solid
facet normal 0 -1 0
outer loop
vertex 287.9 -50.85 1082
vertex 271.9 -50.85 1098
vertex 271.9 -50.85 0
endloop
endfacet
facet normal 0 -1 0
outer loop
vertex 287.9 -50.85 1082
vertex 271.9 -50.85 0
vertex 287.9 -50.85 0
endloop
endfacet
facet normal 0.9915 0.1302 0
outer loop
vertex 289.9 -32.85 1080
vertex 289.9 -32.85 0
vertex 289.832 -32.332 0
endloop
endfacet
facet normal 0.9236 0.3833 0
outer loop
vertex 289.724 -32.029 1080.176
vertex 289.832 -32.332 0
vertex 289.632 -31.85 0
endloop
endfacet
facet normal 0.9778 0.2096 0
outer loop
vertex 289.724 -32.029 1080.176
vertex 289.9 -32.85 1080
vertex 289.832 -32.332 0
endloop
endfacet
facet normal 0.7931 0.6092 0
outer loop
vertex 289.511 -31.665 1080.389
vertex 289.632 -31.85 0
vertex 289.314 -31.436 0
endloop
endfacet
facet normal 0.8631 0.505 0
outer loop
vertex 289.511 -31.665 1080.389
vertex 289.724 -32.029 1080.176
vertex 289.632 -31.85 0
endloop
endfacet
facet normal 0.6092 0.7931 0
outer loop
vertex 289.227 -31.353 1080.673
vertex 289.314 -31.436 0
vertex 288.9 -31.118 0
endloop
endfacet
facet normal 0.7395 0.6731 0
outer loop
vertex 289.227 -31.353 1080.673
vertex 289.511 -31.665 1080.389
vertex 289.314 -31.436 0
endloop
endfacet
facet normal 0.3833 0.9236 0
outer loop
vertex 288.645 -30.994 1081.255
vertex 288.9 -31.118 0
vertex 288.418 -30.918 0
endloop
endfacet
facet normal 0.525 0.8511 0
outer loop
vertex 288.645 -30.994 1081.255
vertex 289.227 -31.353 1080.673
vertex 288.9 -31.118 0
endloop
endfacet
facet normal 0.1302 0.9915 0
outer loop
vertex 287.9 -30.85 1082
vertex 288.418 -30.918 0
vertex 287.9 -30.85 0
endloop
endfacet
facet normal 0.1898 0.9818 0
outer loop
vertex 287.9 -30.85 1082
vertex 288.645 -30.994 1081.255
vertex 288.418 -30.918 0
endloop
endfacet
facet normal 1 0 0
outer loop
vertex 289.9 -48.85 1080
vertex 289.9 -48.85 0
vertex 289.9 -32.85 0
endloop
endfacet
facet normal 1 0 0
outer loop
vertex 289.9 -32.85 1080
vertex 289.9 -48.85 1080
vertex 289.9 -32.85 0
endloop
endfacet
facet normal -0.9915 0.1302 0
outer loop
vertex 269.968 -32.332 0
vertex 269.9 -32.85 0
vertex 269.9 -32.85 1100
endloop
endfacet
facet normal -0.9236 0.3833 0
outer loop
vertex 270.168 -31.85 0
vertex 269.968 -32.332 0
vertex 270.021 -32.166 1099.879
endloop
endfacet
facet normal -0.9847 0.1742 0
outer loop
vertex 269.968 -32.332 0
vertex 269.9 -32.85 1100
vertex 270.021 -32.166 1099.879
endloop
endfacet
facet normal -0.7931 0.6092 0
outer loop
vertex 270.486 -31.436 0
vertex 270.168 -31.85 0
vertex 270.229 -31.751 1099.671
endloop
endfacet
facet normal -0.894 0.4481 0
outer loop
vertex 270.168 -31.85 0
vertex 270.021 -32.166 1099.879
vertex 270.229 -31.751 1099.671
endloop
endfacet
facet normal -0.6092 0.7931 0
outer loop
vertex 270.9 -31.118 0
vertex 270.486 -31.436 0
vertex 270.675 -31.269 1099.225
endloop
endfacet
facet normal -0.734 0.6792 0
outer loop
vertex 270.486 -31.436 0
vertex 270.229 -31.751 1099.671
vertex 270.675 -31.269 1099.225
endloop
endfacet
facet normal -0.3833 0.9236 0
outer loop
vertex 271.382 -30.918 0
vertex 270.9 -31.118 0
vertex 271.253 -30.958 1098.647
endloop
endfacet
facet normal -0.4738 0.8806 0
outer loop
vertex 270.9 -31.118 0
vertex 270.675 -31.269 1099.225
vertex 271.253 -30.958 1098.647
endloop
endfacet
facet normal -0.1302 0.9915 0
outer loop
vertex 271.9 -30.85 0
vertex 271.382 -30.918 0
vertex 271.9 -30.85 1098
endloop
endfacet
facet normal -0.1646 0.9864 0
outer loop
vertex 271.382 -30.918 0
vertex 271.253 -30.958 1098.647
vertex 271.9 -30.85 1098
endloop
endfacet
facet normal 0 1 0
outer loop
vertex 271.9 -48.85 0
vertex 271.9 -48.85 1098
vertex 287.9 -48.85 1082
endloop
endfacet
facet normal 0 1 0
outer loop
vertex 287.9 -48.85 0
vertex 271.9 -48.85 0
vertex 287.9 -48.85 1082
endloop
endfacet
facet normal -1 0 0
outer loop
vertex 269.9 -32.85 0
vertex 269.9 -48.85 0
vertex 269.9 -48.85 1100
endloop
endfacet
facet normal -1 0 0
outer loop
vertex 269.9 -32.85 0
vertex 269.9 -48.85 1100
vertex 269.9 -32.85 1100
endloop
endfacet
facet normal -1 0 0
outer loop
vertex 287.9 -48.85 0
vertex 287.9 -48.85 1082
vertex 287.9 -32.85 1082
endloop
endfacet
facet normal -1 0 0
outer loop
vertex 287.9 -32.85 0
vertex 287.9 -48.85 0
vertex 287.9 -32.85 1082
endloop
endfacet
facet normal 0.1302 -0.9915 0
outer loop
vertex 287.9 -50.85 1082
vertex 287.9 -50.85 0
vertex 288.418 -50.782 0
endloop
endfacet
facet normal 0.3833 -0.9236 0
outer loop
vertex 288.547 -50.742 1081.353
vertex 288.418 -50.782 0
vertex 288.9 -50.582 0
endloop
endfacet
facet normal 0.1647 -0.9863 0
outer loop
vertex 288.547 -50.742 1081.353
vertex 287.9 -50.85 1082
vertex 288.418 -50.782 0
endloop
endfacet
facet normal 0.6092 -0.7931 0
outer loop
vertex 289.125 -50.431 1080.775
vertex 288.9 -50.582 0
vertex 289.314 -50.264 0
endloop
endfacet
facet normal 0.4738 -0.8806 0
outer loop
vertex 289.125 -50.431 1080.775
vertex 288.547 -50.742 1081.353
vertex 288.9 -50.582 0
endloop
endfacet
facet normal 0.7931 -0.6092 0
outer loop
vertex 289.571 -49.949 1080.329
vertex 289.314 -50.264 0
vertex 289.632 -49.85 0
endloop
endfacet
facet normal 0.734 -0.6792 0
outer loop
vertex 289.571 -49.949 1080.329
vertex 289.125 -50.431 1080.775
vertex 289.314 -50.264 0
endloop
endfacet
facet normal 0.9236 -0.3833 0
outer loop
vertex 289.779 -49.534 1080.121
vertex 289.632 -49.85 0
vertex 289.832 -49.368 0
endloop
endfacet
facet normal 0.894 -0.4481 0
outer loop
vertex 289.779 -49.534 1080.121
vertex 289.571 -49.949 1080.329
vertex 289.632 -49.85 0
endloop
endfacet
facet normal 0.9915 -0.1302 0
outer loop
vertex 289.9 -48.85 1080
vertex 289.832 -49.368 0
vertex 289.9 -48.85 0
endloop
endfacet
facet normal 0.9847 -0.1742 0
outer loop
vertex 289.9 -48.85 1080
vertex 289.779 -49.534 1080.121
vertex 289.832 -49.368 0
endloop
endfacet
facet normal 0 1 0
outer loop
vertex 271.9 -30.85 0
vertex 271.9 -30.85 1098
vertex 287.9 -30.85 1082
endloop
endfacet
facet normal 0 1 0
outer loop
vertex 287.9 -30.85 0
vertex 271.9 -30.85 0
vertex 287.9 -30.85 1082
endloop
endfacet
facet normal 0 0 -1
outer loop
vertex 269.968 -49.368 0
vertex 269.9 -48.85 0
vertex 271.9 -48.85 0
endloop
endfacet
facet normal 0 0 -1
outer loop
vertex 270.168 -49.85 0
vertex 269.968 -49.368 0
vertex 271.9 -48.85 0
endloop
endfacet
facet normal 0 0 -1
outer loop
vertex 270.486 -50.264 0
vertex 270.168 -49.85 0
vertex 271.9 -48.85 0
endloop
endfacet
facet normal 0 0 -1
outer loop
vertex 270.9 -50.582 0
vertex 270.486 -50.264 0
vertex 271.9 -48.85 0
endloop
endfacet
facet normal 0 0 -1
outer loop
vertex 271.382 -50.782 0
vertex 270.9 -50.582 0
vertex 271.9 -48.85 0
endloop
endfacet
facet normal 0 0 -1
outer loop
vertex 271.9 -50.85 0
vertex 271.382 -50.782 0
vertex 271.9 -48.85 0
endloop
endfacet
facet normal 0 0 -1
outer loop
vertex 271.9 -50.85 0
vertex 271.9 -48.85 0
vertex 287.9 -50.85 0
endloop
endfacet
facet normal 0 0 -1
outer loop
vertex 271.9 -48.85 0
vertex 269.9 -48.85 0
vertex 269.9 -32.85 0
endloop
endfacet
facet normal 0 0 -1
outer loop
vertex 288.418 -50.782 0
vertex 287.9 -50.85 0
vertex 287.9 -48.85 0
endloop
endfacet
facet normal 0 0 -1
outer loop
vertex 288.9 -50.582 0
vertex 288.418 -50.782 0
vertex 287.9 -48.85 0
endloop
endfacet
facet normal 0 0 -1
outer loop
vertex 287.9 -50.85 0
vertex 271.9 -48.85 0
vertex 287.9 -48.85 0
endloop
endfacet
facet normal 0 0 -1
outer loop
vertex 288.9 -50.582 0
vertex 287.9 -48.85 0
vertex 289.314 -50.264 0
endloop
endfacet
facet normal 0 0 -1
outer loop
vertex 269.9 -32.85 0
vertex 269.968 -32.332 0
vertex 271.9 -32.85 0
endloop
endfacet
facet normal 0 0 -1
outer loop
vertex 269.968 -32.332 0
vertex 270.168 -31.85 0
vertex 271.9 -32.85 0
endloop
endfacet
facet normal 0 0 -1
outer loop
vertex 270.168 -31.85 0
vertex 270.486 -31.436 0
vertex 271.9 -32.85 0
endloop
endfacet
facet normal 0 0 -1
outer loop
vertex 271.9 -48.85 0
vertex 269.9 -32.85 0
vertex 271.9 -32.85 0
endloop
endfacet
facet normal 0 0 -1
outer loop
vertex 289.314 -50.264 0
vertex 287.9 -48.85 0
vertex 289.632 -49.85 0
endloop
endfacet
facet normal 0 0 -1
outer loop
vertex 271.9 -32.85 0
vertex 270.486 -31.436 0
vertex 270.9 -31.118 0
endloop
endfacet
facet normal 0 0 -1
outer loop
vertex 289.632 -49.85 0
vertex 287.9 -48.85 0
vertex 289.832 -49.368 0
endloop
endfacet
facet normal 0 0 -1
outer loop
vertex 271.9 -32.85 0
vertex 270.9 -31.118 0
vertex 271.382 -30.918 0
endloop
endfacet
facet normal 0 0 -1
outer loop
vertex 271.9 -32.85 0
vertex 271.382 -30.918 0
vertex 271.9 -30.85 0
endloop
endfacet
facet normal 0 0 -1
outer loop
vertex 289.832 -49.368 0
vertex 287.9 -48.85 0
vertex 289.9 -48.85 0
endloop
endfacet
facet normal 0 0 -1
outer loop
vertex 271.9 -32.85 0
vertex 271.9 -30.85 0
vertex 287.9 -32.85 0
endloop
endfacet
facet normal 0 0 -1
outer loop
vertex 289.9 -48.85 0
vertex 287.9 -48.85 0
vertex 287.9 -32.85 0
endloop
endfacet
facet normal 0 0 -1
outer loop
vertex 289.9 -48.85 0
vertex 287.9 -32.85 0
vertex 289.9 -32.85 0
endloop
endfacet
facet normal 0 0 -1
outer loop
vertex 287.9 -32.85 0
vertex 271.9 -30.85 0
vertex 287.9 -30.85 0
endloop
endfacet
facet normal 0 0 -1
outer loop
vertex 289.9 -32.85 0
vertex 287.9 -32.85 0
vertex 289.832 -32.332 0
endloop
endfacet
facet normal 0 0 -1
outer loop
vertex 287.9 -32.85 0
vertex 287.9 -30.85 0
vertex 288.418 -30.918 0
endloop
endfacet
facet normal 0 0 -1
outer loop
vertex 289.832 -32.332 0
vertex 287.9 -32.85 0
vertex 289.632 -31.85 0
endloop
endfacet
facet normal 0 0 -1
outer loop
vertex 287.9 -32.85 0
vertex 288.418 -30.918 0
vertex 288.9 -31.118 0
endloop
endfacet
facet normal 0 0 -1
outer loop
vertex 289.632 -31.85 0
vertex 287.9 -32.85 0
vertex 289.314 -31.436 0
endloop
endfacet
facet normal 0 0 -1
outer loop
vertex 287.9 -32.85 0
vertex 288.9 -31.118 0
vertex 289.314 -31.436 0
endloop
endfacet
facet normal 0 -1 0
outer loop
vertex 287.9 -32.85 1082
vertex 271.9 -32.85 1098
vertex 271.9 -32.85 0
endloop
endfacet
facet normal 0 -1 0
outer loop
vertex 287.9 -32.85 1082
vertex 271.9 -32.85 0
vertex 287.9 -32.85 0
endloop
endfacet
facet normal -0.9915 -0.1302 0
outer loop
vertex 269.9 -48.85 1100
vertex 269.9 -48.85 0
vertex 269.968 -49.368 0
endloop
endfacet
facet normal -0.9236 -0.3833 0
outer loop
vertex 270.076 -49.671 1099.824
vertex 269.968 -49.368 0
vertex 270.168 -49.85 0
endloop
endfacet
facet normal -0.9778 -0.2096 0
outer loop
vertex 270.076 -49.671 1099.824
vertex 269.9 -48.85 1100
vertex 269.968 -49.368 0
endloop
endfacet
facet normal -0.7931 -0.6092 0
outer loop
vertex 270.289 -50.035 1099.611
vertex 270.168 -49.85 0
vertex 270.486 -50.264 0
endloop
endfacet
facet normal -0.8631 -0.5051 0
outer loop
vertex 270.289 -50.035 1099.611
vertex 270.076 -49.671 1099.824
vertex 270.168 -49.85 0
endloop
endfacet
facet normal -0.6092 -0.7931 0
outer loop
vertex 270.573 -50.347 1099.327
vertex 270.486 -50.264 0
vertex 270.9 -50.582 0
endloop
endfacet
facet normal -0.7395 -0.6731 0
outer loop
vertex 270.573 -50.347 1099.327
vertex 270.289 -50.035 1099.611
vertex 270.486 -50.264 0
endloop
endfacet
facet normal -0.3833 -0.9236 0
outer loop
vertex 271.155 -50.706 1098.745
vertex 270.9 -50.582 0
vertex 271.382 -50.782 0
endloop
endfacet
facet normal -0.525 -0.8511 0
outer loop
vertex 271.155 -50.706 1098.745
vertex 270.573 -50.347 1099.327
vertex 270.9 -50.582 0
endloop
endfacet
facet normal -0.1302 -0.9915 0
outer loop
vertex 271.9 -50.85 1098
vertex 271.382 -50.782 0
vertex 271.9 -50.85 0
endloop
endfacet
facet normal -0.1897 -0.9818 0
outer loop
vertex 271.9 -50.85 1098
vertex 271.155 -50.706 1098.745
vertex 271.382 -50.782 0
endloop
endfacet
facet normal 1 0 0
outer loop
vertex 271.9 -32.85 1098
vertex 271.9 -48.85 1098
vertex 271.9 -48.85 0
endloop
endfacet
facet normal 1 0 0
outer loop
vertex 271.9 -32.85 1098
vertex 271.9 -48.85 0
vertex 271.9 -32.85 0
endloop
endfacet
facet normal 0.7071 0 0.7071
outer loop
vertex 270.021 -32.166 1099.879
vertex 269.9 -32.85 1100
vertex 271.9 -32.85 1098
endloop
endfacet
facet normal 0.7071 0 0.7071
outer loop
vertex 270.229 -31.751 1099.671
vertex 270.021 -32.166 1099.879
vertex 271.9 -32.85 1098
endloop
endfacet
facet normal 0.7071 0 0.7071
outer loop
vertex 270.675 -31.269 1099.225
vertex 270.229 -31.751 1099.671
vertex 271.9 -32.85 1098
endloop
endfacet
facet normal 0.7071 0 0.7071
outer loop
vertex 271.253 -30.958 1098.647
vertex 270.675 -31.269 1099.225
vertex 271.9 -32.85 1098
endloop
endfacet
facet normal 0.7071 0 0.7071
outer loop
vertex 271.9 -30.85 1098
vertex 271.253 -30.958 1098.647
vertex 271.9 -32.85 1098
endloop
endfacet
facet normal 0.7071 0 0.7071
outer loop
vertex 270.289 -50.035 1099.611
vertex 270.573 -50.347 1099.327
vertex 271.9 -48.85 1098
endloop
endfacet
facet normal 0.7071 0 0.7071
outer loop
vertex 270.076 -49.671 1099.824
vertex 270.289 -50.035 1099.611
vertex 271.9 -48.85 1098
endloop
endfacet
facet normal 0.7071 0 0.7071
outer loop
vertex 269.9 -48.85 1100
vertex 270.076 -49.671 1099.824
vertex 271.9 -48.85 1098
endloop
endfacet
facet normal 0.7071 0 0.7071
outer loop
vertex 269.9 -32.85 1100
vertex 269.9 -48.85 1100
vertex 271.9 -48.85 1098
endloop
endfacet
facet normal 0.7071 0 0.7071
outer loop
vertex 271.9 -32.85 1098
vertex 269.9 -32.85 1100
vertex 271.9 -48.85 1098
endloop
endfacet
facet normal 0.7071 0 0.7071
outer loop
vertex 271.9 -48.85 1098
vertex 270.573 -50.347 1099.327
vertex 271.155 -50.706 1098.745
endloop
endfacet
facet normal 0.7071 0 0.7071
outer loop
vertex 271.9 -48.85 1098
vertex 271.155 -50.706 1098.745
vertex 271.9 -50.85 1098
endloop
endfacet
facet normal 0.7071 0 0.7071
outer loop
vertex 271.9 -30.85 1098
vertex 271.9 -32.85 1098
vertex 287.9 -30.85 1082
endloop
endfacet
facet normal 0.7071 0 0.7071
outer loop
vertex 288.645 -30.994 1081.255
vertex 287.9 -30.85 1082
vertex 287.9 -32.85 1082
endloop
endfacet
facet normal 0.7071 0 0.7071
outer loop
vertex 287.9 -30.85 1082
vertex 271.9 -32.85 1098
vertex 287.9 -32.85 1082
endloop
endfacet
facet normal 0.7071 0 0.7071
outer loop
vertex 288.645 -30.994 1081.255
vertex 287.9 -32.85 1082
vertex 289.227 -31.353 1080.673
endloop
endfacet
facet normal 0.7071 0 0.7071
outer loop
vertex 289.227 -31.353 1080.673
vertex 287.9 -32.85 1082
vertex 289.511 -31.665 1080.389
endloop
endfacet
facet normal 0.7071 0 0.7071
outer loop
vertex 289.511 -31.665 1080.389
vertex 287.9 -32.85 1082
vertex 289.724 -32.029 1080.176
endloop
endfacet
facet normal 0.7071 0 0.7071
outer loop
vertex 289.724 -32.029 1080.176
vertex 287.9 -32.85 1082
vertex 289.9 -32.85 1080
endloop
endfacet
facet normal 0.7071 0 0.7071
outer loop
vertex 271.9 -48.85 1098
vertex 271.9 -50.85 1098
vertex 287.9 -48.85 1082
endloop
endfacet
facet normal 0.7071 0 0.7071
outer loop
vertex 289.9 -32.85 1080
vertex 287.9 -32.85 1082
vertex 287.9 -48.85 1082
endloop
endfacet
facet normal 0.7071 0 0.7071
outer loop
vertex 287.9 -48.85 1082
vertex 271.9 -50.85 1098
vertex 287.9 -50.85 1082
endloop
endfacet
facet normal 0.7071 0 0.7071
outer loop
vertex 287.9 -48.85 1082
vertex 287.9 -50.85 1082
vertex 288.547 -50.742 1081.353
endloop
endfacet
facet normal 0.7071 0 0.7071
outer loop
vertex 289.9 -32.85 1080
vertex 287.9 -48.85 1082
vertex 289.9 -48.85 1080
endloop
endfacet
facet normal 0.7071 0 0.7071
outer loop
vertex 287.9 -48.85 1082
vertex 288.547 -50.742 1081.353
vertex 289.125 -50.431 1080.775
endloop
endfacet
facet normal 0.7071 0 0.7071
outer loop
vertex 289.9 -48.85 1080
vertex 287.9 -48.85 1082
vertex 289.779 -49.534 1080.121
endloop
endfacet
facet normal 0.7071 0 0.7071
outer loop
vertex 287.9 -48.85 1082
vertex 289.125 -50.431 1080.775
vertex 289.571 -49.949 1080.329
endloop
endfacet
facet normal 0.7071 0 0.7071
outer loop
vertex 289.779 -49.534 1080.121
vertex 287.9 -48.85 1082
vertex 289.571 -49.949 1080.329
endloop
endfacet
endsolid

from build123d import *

# Parameters (mm, degrees)
SKETCH1_W           = 20
SKETCH1_H           = 20
BOSS_EXTRUDE1_DEPTH = 1100
FILLET1_R           = 2
SKETCH2_W           = 16
SKETCH2_H           = 16
CUT_EXTRUDE1_DEPTH  = 1101
CUT_EXTRUDE2_DEPTH  = 21


with BuildPart() as part:
    # Sketch1 → Boss-Extrude1 (new body)
    with BuildSketch(Plane.XY):
        with Locations((279.9, -40.85)):
            Rectangle(SKETCH1_W, SKETCH1_H)
    extrude(amount=BOSS_EXTRUDE1_DEPTH)

    # Fillet1
    fillet1_edges = [part.edges().sort_by_distance(p)[0] for p in [
        (269.9, -30.85, 550),
        (289.9, -30.85, 550),
        (289.9, -50.85, 550),
        (269.9, -50.85, 550),
    ]]
    fillet(fillet1_edges, radius=FILLET1_R)

    # Sketch2 → Cut-Extrude1 (cut, through all)
    with BuildSketch(Plane.XY.offset(1100)):
        with Locations((279.9, -40.85)):
            Rectangle(SKETCH2_W, SKETCH2_H)
    extrude(amount=-CUT_EXTRUDE1_DEPTH, mode=Mode.SUBTRACT)

    # Sketch3 → Cut-Extrude2 (cut, through all)
    with BuildSketch(Plane.XZ.offset(50.85)):
        Polygon((269.9, 1100), (289.9, 1080), (289.9, 1100), align=None)
    extrude(amount=-CUT_EXTRUDE2_DEPTH, mode=Mode.SUBTRACT)


solid = part.part
